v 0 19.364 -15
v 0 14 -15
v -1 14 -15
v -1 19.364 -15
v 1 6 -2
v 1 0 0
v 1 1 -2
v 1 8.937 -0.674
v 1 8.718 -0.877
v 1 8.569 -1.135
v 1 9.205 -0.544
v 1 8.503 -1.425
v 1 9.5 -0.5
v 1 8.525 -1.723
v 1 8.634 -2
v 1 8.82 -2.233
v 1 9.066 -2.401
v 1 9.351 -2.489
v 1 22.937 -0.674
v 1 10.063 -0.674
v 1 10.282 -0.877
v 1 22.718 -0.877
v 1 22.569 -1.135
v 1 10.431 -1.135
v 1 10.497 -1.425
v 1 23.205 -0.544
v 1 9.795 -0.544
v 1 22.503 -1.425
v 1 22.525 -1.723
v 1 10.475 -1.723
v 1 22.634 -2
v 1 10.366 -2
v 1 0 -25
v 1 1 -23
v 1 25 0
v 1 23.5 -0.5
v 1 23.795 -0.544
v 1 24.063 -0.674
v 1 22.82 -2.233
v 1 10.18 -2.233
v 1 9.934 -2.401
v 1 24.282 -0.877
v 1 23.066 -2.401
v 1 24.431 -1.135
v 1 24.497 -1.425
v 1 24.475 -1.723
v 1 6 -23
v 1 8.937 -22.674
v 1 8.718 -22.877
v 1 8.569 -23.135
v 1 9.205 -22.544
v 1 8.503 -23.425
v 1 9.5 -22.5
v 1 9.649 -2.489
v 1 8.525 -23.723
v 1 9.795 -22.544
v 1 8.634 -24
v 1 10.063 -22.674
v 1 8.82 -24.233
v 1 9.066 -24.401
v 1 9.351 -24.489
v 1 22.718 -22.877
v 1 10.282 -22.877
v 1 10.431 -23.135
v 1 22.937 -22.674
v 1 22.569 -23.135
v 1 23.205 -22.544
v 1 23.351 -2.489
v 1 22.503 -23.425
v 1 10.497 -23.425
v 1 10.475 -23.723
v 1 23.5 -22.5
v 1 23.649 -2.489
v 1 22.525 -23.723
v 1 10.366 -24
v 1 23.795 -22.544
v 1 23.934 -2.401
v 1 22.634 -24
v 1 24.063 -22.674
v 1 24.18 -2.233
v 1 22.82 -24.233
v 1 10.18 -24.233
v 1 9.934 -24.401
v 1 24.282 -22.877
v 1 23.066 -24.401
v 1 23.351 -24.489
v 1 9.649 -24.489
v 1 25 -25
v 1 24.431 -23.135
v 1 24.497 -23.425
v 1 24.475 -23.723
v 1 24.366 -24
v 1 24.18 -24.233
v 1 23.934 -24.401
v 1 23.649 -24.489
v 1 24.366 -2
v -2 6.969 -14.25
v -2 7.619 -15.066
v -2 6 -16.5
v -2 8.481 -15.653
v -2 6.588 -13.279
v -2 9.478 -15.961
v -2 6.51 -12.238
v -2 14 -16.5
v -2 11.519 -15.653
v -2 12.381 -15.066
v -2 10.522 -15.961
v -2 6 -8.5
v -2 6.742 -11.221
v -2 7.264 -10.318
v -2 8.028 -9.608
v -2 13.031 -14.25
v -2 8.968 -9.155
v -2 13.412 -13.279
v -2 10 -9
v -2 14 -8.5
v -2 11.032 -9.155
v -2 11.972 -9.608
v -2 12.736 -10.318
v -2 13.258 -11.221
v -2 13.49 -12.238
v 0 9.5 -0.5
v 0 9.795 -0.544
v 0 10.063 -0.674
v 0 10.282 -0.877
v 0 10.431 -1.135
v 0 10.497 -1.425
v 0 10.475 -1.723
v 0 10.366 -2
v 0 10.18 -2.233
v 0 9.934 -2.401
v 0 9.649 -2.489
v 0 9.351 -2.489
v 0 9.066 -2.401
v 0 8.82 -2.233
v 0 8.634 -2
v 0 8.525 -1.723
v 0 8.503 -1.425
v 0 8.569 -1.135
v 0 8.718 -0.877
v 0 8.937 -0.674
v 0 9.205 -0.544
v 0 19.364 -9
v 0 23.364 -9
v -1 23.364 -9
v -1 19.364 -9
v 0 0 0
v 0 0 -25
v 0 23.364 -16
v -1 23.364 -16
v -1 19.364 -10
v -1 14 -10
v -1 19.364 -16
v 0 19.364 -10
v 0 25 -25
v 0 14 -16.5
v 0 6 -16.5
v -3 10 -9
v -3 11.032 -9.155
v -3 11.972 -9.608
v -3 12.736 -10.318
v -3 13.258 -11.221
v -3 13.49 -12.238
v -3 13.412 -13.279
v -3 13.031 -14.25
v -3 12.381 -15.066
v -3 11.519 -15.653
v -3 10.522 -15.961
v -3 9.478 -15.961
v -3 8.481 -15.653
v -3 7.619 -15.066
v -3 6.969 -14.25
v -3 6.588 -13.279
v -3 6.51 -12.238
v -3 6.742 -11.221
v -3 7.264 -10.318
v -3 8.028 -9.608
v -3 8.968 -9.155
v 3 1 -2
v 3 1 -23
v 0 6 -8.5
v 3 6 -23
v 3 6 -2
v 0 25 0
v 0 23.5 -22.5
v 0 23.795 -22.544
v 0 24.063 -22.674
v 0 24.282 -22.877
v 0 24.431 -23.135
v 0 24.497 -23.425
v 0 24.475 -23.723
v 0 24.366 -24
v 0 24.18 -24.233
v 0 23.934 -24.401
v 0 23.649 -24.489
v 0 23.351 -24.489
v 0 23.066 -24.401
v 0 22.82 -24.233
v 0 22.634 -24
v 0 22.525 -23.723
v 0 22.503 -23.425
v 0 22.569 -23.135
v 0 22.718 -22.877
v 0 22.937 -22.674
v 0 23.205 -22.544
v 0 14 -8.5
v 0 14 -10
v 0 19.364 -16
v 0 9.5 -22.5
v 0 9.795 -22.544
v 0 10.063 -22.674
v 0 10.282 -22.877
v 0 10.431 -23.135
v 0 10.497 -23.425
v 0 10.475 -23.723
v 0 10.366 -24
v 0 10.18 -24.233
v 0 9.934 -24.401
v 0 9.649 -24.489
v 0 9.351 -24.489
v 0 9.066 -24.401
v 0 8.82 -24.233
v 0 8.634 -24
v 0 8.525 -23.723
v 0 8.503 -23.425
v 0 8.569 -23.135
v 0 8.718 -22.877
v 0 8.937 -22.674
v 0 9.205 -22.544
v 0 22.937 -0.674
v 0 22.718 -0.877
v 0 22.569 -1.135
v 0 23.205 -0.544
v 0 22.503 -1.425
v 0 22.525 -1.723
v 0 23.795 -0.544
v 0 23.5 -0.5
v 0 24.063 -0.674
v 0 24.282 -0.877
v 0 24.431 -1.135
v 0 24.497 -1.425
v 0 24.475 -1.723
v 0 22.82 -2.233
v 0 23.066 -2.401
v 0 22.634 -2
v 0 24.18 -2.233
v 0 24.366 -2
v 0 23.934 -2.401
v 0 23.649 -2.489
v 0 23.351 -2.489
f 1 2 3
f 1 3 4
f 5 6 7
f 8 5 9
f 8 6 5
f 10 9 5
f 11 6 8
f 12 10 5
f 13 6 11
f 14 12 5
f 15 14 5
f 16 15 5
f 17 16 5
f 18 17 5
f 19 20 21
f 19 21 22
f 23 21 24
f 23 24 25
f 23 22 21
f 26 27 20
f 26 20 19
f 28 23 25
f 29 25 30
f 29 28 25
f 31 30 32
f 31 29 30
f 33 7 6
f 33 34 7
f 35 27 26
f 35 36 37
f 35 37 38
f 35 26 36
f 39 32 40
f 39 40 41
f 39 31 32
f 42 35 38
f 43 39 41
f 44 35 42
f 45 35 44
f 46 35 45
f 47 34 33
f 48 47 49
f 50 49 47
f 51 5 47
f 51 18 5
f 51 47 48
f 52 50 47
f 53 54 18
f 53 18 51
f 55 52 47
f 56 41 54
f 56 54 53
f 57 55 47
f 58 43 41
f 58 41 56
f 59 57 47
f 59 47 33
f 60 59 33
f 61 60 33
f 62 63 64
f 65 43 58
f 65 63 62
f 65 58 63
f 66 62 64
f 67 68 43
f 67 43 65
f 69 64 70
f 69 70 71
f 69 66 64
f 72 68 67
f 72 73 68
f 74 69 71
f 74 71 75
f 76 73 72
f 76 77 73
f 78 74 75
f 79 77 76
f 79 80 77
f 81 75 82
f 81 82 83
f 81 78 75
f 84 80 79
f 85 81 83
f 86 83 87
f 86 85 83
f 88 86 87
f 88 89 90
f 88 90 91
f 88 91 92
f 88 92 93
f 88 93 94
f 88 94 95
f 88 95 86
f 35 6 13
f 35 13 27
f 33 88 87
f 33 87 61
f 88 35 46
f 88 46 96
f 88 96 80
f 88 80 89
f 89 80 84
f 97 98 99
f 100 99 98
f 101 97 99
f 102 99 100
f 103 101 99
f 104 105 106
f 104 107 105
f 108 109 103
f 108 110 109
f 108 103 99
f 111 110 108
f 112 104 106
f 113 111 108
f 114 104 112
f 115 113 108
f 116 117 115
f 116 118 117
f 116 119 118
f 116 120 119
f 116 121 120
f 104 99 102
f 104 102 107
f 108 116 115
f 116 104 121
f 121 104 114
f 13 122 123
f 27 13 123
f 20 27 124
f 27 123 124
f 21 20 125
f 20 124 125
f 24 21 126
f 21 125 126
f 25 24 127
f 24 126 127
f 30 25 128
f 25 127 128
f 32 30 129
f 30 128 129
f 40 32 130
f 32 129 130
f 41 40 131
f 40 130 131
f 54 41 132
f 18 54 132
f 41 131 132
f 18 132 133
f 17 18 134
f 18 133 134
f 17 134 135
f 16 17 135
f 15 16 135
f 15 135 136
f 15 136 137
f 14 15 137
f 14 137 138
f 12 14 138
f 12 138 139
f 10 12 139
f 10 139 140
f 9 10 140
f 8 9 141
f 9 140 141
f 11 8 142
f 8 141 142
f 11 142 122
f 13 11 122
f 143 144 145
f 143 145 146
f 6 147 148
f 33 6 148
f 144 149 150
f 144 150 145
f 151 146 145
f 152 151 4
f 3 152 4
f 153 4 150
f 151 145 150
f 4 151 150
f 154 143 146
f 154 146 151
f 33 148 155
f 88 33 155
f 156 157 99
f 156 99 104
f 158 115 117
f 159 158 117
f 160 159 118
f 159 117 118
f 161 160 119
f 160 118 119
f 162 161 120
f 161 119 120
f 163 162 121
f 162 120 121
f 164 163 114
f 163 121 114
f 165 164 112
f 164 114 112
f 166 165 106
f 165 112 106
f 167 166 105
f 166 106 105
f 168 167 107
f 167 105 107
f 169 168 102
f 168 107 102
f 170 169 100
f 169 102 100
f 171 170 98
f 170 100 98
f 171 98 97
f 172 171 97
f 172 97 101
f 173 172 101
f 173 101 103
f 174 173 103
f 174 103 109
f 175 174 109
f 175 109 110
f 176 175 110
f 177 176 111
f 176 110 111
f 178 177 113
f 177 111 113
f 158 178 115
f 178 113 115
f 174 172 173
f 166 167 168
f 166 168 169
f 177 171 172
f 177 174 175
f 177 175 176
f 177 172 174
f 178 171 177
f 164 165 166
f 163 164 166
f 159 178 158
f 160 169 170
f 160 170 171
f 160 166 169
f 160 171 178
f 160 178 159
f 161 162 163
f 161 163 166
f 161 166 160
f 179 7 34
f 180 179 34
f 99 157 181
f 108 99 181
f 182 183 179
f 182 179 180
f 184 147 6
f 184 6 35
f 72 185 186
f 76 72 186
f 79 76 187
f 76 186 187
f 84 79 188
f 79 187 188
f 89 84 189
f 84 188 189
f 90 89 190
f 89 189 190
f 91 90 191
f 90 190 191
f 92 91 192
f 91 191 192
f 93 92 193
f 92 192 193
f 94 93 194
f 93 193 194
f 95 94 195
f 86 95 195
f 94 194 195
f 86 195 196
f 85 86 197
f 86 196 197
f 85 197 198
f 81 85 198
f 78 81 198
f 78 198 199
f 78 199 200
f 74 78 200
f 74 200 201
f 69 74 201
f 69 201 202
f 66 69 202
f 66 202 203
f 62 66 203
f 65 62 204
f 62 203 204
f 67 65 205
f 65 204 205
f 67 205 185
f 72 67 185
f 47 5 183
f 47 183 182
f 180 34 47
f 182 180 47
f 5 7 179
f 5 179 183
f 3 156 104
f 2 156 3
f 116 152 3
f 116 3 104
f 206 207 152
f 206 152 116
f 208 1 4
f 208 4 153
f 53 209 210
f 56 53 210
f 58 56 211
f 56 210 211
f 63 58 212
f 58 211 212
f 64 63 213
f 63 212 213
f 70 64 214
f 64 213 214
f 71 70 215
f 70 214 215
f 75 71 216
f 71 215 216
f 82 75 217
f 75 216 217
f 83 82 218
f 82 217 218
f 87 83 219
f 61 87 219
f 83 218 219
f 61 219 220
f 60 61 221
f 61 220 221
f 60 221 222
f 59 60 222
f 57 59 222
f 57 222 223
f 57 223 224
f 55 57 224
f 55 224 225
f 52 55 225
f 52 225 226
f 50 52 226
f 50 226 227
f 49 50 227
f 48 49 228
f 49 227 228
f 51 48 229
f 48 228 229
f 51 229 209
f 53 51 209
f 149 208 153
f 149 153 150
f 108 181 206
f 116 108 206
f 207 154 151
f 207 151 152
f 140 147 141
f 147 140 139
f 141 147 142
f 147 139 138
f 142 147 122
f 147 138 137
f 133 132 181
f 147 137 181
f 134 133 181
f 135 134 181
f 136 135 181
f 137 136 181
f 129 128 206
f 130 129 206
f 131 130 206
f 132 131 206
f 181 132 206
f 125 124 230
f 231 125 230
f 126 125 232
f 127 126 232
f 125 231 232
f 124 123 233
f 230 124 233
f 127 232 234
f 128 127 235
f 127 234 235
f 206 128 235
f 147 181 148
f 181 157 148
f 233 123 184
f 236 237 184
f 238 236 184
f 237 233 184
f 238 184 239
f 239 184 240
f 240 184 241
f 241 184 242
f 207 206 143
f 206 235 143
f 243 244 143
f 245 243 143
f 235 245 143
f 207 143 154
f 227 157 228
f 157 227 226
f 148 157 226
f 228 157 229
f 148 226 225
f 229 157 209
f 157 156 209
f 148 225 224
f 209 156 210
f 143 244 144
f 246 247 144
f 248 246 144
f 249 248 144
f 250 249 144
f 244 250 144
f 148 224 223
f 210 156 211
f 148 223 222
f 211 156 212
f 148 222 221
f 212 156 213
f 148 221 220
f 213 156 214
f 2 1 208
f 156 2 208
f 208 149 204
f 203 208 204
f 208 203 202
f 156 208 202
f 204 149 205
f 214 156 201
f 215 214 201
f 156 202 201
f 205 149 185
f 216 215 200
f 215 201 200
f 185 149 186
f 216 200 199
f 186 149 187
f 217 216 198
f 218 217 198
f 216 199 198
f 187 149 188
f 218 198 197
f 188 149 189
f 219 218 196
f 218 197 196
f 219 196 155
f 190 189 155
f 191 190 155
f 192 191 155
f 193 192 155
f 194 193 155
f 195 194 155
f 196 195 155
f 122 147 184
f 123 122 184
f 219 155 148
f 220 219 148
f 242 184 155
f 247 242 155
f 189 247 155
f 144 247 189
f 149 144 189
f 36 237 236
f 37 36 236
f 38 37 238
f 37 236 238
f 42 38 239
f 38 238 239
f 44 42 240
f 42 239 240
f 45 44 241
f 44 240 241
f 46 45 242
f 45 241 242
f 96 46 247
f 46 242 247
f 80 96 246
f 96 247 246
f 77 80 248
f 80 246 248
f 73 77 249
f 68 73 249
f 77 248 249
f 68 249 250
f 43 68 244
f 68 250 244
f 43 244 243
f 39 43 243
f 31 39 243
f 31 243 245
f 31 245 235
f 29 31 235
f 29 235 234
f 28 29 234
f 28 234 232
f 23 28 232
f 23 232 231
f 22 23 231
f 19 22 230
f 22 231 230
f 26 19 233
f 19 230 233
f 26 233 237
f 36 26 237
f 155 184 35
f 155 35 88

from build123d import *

# Parameters (mm, degrees)
SKETCH1_W           = 25
SKETCH1_H           = 25
BOSS_EXTRUDE1_DEPTH = 1
SKETCH2_W           = 21
SKETCH2_H           = 5
BOSS_EXTRUDE2_DEPTH = 2
SKETCH3_W           = 8
SKETCH3_H           = 8
BOSS_EXTRUDE3_DEPTH = 2
SKETCH5_R           = 3.5
BOSS_EXTRUDE4_DEPTH = 1
BOSS_EXTRUDE5_DEPTH = 1
SKETCH7_R           = 1
CUT_EXTRUDE1_DEPTH  = 1


with BuildPart() as part:
    # Sketch1 → Boss-Extrude1 (new body)
    with BuildSketch(Plane(origin=(0, 0, 0), x_dir=(0, 0, -1), z_dir=(1, 0, 0))):
        with Locations((12.5, 12.5)):
            Rectangle(SKETCH1_W, SKETCH1_H)
    extrude(amount=BOSS_EXTRUDE1_DEPTH)

    # Sketch2 → Boss-Extrude2 (add)
    with BuildSketch(Plane(origin=(1, 0, 0), x_dir=(0, 0, -1), z_dir=(1, 0, 0))):
        with Locations((12.5, 3.5)):
            Rectangle(SKETCH2_W, SKETCH2_H)
    extrude(amount=BOSS_EXTRUDE2_DEPTH)

    # Sketch3 → Boss-Extrude3 (add)
    with BuildSketch(Plane.ZY):
        with Locations((-12.5, 10)):
            Rectangle(SKETCH3_W, SKETCH3_H)
    extrude(amount=BOSS_EXTRUDE3_DEPTH)

    # Sketch5 → Boss-Extrude4 (add)
    with BuildSketch(Plane.ZY.offset(2)):
        with Locations((-12.5, 10)):
            Circle(SKETCH5_R)
    extrude(amount=BOSS_EXTRUDE4_DEPTH)

    # Sketch6 → Boss-Extrude5 (add)
    with BuildSketch(Plane.ZY):
        Polygon((-16, 23.363866642), (-9, 23.363866642), (-9, 19.363866642), (-10, 19.363866642), (-10, 14), (-15, 14), (-15, 19.363866642), (-16, 19.363866642), align=None)
    extrude(amount=BOSS_EXTRUDE5_DEPTH)

    # Sketch7 → Cut-Extrude1 (cut)
    with BuildSketch(Plane.ZY):
        with Locations((-23.5, 23.5)):
            Circle(SKETCH7_R)
        with Locations((-1.5, 23.5)):
            Circle(SKETCH7_R)
        with Locations((-1.5, 9.5)):
            Circle(SKETCH7_R)
        with Locations((-23.5, 9.5)):
            Circle(SKETCH7_R)
    extrude(amount=-CUT_EXTRUDE1_DEPTH, mode=Mode.SUBTRACT)


solid = part.part
